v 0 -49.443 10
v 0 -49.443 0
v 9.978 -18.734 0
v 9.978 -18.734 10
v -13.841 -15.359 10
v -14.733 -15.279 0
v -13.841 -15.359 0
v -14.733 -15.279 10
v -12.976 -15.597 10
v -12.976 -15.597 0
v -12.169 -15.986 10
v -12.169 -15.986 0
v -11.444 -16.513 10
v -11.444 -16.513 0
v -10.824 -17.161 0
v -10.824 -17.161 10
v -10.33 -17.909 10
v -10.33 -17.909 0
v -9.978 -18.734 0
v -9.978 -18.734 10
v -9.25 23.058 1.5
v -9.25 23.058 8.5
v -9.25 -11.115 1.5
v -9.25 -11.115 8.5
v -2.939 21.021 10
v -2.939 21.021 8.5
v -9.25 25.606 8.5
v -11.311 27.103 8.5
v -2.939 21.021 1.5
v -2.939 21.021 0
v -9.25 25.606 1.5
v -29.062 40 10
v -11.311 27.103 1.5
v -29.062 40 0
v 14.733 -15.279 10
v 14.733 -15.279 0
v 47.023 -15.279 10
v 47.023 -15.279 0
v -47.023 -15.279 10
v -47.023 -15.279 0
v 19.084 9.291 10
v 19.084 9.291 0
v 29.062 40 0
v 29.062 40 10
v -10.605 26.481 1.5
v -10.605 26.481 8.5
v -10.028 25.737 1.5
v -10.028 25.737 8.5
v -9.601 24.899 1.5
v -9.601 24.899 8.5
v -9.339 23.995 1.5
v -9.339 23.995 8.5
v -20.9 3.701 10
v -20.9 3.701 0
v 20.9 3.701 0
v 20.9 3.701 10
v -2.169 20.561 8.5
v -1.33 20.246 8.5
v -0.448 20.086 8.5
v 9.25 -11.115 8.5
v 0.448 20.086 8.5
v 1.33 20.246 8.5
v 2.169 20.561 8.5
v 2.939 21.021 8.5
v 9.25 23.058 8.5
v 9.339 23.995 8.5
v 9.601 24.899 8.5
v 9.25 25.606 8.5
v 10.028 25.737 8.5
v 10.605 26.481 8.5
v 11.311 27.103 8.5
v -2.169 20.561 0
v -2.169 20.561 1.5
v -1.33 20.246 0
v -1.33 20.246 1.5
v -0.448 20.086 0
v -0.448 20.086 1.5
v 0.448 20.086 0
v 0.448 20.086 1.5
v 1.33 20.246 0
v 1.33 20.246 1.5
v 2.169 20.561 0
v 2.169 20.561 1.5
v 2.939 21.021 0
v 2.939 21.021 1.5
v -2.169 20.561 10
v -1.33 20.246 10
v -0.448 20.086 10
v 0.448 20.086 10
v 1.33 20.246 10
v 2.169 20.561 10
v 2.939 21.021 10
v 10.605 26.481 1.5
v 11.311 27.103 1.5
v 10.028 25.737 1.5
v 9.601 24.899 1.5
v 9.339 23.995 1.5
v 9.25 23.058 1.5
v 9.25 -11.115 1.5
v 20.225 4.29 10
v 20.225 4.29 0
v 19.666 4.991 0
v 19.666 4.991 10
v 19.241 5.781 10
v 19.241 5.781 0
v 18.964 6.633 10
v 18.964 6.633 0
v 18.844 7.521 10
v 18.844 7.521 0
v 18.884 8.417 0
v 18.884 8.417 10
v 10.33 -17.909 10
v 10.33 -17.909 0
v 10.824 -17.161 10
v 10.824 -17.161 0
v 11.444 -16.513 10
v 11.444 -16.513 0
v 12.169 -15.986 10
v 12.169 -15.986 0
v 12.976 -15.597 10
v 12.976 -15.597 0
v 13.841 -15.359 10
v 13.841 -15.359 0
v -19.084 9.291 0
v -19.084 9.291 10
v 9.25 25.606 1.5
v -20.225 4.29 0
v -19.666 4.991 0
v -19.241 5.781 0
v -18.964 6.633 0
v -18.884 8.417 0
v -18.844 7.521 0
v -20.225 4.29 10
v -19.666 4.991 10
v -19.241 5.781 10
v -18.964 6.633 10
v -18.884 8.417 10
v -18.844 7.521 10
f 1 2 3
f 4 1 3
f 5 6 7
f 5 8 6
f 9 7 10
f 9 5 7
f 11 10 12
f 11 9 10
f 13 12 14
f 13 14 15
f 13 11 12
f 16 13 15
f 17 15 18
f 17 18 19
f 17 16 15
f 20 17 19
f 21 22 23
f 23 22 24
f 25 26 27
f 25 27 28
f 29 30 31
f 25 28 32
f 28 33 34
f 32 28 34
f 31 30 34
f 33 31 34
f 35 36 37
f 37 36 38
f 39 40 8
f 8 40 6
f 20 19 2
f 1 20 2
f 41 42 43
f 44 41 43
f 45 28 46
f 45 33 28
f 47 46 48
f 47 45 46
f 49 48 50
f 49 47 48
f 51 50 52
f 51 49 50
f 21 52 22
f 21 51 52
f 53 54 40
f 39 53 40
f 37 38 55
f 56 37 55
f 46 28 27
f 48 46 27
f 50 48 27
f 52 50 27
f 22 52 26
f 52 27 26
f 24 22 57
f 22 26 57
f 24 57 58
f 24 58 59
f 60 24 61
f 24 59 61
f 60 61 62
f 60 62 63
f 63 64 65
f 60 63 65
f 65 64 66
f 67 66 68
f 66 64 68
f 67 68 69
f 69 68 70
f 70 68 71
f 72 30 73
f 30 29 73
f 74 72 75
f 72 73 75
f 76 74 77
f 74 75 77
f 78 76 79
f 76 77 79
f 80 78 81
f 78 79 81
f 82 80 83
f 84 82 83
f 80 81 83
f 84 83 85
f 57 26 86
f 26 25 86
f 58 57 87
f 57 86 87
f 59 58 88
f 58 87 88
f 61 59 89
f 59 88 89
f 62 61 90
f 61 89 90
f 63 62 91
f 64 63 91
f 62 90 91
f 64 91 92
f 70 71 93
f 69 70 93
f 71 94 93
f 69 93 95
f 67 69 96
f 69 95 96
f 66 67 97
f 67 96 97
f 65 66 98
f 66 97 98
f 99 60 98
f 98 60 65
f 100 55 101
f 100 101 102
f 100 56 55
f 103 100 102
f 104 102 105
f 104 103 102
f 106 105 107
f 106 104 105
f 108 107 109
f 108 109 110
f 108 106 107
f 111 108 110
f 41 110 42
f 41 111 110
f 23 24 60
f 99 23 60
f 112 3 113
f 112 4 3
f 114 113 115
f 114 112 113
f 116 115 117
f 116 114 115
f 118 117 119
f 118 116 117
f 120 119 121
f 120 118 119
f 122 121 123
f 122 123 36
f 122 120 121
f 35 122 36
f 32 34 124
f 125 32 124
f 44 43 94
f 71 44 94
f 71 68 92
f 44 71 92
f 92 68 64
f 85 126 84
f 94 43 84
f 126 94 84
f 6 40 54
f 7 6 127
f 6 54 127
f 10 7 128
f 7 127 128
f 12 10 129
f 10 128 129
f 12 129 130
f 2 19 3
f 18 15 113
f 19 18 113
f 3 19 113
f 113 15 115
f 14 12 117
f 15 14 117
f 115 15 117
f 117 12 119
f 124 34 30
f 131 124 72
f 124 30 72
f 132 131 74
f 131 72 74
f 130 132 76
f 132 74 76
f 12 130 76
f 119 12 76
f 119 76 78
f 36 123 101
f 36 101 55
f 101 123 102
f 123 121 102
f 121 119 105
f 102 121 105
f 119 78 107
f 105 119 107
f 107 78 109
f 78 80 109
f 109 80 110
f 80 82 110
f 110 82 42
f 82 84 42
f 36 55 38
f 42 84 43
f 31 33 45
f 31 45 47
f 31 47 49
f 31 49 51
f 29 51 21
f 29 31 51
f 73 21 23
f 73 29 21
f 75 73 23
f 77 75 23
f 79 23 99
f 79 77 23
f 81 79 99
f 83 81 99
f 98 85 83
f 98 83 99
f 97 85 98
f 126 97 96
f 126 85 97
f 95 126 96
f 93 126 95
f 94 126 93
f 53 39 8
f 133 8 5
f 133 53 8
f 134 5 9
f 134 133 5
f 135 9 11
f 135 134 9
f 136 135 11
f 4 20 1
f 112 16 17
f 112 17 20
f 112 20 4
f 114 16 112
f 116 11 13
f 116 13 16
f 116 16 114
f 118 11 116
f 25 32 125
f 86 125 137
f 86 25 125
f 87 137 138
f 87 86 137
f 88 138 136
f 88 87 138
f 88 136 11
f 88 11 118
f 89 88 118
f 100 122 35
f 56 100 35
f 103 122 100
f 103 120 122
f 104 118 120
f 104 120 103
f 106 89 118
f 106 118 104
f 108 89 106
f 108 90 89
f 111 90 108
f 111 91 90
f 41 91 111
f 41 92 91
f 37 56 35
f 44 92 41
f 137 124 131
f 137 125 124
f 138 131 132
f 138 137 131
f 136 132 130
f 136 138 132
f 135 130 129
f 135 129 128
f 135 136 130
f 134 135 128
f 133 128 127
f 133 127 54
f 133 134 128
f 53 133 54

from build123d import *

# Parameters (mm, degrees)
F1_DEPTH = 10
F3_START = -1.5
F3_DEPTH = 7
F4_R     = 5


with BuildPart() as f1:
    # F0 (on Top) → F1 (new body)
    with BuildSketch(Plane.XY):
        Polygon((0, 18.8854382), (-29.0617011202, 40), (-17.9611190632, 5.83592135), align=None)
        Polygon((17.9611190632, 5.83592135), (29.0617011202, 40), (0, 18.8854382), align=None)
        Polygon((0, 18.8854382), (-17.9611190632, 5.83592135), (-11.100582057, -15.27864045), (11.100582057, -15.27864045), (17.9611190632, 5.83592135), align=None)
        Polygon((11.100582057, -15.27864045), (47.0228201834, -15.27864045), (17.9611190632, 5.83592135), align=None)
        Polygon((-11.100582057, -15.27864045), (0, -49.4427191), (11.100582057, -15.27864045), align=None)
        Polygon((-17.9611190632, 5.83592135), (-47.0228201834, -15.27864045), (-11.100582057, -15.27864045), align=None)
    extrude(amount=F1_DEPTH)

    # F2 (on face) → F3 (cut)
    with BuildSketch(Plane.XY.offset(10).offset(F3_START)):
        Polygon((-9.25, -11.1145618), (0, -11.1145618), (9.25, -11.1145618), (9.25, 25.605956584), (0, 18.8854382), (-9.25, 25.605956584), align=None)
    extrude(amount=-F3_DEPTH, mode=Mode.SUBTRACT)

    # F4
    f4_edges = [f1.edges().sort_by_distance(p)[0] for p in [
        (-17.961119, 5.835921, 5),
        (-11.100582, -15.27864, 5),
        (11.100582, -15.27864, 5),
        (17.961119, 5.835921, 5),
        (0, 18.885438, 9.25),
        (0, 18.885438, 0.75),
        (9.25, 25.605957, 5),
        (-9.25, 25.605957, 5),
    ]]
    fillet(f4_edges, radius=F4_R)


solid = f1.part
